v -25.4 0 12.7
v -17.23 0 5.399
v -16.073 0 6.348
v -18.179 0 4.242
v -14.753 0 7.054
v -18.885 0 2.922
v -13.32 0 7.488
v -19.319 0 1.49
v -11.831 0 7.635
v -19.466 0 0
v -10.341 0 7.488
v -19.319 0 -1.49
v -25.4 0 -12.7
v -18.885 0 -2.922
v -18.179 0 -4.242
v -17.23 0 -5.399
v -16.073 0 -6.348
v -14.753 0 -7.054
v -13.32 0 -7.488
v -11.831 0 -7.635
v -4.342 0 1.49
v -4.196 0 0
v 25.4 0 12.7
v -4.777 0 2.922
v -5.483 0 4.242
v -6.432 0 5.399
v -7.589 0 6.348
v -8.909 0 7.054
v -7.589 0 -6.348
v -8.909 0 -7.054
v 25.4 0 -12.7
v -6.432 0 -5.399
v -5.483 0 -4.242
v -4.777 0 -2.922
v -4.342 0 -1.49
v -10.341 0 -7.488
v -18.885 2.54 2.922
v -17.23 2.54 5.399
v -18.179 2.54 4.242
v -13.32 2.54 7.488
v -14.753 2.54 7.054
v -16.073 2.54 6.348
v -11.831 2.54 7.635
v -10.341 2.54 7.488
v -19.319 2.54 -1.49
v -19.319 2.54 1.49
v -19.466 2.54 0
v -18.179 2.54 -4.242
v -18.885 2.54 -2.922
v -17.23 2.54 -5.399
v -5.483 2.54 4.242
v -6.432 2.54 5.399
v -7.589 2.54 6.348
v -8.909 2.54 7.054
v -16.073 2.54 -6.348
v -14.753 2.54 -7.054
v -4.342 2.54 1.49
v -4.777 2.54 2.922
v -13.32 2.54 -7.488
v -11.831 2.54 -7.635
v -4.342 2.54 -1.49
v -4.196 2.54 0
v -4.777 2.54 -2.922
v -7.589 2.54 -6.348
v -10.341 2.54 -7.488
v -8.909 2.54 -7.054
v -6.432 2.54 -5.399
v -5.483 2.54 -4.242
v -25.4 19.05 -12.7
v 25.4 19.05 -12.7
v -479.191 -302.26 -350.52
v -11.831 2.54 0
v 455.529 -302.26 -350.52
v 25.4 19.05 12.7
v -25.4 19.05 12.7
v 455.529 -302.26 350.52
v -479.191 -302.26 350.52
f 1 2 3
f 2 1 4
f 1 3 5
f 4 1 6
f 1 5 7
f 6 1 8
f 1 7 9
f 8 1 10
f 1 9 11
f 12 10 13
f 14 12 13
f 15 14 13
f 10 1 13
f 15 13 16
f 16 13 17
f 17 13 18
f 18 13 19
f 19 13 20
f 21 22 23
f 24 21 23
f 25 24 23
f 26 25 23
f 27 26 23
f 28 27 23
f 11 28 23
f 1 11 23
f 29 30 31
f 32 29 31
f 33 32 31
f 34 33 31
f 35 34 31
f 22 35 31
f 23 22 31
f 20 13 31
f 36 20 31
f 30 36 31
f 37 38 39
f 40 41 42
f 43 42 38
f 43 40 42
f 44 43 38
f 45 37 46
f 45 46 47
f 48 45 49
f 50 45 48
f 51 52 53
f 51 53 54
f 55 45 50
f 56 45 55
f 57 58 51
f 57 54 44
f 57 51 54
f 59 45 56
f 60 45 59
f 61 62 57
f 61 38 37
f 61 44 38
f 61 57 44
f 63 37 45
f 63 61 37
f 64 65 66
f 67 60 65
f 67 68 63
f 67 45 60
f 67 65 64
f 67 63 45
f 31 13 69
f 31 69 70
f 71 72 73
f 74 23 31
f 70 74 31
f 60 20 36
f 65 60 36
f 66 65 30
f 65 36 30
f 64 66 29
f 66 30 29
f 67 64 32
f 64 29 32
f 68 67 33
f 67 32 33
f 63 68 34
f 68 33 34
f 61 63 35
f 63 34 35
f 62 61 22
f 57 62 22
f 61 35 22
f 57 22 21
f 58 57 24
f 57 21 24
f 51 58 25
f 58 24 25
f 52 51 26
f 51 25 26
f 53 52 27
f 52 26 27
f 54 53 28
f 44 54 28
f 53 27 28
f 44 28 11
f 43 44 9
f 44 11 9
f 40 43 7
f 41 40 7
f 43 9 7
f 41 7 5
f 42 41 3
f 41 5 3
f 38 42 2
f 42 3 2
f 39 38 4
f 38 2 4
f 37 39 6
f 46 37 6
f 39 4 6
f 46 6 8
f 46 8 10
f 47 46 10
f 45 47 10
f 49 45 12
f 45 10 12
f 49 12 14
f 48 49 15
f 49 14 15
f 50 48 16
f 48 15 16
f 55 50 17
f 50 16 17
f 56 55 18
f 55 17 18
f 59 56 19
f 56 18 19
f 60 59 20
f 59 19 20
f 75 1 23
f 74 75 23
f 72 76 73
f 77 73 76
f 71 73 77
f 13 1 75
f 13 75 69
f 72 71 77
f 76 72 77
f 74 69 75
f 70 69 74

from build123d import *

# Parameters (mm, degrees)
SKETCH1_W           = 50.8
SKETCH1_H           = 25.4
BOSS_EXTRUDE1_DEPTH = 19.05
SKETCH2_R           = 7.635016023
CUT_EXTRUDE1_DEPTH  = 2.54


with BuildPart() as part:
    # Sketch1 → Boss-Extrude1 (new body)
    with BuildSketch(Plane(origin=(0, 0, 0), x_dir=(1, 0, 0), z_dir=(0, 1, 0))):
        Rectangle(SKETCH1_W, SKETCH1_H)
    extrude(amount=BOSS_EXTRUDE1_DEPTH)

    # Sketch2 → Cut-Extrude1 (cut)
    with BuildSketch(Plane.XZ):
        with Locations(Location((-11.830806994, 0, 0), (0, 0, 270))):
            Circle(SKETCH2_R)
    extrude(amount=-CUT_EXTRUDE1_DEPTH, mode=Mode.SUBTRACT)


with BuildPart() as body_2:
    # Sketch4 → Loft1 section 0
    with BuildSketch(Plane(origin=(0, -302.26, 0), x_dir=(-1, 0, 0), z_dir=(0, -1, 0)), mode=Mode.PRIVATE) as loft1_s0:
        with BuildLine():
            Line((-455.529193006, 350.52), (479.190806994, 350.52))
            Line((479.190806994, 350.52), (479.190806994, -350.52))
            Line((479.190806994, -350.52), (-455.529193006, -350.52))
            Line((-455.529193006, -350.52), (-455.529193006, 350.52))
        make_face()
    loft([loft1_s0.sketch, Vertex(-11.830806994, 2.54, 0)])


solid = Compound([part.part, body_2.part])
